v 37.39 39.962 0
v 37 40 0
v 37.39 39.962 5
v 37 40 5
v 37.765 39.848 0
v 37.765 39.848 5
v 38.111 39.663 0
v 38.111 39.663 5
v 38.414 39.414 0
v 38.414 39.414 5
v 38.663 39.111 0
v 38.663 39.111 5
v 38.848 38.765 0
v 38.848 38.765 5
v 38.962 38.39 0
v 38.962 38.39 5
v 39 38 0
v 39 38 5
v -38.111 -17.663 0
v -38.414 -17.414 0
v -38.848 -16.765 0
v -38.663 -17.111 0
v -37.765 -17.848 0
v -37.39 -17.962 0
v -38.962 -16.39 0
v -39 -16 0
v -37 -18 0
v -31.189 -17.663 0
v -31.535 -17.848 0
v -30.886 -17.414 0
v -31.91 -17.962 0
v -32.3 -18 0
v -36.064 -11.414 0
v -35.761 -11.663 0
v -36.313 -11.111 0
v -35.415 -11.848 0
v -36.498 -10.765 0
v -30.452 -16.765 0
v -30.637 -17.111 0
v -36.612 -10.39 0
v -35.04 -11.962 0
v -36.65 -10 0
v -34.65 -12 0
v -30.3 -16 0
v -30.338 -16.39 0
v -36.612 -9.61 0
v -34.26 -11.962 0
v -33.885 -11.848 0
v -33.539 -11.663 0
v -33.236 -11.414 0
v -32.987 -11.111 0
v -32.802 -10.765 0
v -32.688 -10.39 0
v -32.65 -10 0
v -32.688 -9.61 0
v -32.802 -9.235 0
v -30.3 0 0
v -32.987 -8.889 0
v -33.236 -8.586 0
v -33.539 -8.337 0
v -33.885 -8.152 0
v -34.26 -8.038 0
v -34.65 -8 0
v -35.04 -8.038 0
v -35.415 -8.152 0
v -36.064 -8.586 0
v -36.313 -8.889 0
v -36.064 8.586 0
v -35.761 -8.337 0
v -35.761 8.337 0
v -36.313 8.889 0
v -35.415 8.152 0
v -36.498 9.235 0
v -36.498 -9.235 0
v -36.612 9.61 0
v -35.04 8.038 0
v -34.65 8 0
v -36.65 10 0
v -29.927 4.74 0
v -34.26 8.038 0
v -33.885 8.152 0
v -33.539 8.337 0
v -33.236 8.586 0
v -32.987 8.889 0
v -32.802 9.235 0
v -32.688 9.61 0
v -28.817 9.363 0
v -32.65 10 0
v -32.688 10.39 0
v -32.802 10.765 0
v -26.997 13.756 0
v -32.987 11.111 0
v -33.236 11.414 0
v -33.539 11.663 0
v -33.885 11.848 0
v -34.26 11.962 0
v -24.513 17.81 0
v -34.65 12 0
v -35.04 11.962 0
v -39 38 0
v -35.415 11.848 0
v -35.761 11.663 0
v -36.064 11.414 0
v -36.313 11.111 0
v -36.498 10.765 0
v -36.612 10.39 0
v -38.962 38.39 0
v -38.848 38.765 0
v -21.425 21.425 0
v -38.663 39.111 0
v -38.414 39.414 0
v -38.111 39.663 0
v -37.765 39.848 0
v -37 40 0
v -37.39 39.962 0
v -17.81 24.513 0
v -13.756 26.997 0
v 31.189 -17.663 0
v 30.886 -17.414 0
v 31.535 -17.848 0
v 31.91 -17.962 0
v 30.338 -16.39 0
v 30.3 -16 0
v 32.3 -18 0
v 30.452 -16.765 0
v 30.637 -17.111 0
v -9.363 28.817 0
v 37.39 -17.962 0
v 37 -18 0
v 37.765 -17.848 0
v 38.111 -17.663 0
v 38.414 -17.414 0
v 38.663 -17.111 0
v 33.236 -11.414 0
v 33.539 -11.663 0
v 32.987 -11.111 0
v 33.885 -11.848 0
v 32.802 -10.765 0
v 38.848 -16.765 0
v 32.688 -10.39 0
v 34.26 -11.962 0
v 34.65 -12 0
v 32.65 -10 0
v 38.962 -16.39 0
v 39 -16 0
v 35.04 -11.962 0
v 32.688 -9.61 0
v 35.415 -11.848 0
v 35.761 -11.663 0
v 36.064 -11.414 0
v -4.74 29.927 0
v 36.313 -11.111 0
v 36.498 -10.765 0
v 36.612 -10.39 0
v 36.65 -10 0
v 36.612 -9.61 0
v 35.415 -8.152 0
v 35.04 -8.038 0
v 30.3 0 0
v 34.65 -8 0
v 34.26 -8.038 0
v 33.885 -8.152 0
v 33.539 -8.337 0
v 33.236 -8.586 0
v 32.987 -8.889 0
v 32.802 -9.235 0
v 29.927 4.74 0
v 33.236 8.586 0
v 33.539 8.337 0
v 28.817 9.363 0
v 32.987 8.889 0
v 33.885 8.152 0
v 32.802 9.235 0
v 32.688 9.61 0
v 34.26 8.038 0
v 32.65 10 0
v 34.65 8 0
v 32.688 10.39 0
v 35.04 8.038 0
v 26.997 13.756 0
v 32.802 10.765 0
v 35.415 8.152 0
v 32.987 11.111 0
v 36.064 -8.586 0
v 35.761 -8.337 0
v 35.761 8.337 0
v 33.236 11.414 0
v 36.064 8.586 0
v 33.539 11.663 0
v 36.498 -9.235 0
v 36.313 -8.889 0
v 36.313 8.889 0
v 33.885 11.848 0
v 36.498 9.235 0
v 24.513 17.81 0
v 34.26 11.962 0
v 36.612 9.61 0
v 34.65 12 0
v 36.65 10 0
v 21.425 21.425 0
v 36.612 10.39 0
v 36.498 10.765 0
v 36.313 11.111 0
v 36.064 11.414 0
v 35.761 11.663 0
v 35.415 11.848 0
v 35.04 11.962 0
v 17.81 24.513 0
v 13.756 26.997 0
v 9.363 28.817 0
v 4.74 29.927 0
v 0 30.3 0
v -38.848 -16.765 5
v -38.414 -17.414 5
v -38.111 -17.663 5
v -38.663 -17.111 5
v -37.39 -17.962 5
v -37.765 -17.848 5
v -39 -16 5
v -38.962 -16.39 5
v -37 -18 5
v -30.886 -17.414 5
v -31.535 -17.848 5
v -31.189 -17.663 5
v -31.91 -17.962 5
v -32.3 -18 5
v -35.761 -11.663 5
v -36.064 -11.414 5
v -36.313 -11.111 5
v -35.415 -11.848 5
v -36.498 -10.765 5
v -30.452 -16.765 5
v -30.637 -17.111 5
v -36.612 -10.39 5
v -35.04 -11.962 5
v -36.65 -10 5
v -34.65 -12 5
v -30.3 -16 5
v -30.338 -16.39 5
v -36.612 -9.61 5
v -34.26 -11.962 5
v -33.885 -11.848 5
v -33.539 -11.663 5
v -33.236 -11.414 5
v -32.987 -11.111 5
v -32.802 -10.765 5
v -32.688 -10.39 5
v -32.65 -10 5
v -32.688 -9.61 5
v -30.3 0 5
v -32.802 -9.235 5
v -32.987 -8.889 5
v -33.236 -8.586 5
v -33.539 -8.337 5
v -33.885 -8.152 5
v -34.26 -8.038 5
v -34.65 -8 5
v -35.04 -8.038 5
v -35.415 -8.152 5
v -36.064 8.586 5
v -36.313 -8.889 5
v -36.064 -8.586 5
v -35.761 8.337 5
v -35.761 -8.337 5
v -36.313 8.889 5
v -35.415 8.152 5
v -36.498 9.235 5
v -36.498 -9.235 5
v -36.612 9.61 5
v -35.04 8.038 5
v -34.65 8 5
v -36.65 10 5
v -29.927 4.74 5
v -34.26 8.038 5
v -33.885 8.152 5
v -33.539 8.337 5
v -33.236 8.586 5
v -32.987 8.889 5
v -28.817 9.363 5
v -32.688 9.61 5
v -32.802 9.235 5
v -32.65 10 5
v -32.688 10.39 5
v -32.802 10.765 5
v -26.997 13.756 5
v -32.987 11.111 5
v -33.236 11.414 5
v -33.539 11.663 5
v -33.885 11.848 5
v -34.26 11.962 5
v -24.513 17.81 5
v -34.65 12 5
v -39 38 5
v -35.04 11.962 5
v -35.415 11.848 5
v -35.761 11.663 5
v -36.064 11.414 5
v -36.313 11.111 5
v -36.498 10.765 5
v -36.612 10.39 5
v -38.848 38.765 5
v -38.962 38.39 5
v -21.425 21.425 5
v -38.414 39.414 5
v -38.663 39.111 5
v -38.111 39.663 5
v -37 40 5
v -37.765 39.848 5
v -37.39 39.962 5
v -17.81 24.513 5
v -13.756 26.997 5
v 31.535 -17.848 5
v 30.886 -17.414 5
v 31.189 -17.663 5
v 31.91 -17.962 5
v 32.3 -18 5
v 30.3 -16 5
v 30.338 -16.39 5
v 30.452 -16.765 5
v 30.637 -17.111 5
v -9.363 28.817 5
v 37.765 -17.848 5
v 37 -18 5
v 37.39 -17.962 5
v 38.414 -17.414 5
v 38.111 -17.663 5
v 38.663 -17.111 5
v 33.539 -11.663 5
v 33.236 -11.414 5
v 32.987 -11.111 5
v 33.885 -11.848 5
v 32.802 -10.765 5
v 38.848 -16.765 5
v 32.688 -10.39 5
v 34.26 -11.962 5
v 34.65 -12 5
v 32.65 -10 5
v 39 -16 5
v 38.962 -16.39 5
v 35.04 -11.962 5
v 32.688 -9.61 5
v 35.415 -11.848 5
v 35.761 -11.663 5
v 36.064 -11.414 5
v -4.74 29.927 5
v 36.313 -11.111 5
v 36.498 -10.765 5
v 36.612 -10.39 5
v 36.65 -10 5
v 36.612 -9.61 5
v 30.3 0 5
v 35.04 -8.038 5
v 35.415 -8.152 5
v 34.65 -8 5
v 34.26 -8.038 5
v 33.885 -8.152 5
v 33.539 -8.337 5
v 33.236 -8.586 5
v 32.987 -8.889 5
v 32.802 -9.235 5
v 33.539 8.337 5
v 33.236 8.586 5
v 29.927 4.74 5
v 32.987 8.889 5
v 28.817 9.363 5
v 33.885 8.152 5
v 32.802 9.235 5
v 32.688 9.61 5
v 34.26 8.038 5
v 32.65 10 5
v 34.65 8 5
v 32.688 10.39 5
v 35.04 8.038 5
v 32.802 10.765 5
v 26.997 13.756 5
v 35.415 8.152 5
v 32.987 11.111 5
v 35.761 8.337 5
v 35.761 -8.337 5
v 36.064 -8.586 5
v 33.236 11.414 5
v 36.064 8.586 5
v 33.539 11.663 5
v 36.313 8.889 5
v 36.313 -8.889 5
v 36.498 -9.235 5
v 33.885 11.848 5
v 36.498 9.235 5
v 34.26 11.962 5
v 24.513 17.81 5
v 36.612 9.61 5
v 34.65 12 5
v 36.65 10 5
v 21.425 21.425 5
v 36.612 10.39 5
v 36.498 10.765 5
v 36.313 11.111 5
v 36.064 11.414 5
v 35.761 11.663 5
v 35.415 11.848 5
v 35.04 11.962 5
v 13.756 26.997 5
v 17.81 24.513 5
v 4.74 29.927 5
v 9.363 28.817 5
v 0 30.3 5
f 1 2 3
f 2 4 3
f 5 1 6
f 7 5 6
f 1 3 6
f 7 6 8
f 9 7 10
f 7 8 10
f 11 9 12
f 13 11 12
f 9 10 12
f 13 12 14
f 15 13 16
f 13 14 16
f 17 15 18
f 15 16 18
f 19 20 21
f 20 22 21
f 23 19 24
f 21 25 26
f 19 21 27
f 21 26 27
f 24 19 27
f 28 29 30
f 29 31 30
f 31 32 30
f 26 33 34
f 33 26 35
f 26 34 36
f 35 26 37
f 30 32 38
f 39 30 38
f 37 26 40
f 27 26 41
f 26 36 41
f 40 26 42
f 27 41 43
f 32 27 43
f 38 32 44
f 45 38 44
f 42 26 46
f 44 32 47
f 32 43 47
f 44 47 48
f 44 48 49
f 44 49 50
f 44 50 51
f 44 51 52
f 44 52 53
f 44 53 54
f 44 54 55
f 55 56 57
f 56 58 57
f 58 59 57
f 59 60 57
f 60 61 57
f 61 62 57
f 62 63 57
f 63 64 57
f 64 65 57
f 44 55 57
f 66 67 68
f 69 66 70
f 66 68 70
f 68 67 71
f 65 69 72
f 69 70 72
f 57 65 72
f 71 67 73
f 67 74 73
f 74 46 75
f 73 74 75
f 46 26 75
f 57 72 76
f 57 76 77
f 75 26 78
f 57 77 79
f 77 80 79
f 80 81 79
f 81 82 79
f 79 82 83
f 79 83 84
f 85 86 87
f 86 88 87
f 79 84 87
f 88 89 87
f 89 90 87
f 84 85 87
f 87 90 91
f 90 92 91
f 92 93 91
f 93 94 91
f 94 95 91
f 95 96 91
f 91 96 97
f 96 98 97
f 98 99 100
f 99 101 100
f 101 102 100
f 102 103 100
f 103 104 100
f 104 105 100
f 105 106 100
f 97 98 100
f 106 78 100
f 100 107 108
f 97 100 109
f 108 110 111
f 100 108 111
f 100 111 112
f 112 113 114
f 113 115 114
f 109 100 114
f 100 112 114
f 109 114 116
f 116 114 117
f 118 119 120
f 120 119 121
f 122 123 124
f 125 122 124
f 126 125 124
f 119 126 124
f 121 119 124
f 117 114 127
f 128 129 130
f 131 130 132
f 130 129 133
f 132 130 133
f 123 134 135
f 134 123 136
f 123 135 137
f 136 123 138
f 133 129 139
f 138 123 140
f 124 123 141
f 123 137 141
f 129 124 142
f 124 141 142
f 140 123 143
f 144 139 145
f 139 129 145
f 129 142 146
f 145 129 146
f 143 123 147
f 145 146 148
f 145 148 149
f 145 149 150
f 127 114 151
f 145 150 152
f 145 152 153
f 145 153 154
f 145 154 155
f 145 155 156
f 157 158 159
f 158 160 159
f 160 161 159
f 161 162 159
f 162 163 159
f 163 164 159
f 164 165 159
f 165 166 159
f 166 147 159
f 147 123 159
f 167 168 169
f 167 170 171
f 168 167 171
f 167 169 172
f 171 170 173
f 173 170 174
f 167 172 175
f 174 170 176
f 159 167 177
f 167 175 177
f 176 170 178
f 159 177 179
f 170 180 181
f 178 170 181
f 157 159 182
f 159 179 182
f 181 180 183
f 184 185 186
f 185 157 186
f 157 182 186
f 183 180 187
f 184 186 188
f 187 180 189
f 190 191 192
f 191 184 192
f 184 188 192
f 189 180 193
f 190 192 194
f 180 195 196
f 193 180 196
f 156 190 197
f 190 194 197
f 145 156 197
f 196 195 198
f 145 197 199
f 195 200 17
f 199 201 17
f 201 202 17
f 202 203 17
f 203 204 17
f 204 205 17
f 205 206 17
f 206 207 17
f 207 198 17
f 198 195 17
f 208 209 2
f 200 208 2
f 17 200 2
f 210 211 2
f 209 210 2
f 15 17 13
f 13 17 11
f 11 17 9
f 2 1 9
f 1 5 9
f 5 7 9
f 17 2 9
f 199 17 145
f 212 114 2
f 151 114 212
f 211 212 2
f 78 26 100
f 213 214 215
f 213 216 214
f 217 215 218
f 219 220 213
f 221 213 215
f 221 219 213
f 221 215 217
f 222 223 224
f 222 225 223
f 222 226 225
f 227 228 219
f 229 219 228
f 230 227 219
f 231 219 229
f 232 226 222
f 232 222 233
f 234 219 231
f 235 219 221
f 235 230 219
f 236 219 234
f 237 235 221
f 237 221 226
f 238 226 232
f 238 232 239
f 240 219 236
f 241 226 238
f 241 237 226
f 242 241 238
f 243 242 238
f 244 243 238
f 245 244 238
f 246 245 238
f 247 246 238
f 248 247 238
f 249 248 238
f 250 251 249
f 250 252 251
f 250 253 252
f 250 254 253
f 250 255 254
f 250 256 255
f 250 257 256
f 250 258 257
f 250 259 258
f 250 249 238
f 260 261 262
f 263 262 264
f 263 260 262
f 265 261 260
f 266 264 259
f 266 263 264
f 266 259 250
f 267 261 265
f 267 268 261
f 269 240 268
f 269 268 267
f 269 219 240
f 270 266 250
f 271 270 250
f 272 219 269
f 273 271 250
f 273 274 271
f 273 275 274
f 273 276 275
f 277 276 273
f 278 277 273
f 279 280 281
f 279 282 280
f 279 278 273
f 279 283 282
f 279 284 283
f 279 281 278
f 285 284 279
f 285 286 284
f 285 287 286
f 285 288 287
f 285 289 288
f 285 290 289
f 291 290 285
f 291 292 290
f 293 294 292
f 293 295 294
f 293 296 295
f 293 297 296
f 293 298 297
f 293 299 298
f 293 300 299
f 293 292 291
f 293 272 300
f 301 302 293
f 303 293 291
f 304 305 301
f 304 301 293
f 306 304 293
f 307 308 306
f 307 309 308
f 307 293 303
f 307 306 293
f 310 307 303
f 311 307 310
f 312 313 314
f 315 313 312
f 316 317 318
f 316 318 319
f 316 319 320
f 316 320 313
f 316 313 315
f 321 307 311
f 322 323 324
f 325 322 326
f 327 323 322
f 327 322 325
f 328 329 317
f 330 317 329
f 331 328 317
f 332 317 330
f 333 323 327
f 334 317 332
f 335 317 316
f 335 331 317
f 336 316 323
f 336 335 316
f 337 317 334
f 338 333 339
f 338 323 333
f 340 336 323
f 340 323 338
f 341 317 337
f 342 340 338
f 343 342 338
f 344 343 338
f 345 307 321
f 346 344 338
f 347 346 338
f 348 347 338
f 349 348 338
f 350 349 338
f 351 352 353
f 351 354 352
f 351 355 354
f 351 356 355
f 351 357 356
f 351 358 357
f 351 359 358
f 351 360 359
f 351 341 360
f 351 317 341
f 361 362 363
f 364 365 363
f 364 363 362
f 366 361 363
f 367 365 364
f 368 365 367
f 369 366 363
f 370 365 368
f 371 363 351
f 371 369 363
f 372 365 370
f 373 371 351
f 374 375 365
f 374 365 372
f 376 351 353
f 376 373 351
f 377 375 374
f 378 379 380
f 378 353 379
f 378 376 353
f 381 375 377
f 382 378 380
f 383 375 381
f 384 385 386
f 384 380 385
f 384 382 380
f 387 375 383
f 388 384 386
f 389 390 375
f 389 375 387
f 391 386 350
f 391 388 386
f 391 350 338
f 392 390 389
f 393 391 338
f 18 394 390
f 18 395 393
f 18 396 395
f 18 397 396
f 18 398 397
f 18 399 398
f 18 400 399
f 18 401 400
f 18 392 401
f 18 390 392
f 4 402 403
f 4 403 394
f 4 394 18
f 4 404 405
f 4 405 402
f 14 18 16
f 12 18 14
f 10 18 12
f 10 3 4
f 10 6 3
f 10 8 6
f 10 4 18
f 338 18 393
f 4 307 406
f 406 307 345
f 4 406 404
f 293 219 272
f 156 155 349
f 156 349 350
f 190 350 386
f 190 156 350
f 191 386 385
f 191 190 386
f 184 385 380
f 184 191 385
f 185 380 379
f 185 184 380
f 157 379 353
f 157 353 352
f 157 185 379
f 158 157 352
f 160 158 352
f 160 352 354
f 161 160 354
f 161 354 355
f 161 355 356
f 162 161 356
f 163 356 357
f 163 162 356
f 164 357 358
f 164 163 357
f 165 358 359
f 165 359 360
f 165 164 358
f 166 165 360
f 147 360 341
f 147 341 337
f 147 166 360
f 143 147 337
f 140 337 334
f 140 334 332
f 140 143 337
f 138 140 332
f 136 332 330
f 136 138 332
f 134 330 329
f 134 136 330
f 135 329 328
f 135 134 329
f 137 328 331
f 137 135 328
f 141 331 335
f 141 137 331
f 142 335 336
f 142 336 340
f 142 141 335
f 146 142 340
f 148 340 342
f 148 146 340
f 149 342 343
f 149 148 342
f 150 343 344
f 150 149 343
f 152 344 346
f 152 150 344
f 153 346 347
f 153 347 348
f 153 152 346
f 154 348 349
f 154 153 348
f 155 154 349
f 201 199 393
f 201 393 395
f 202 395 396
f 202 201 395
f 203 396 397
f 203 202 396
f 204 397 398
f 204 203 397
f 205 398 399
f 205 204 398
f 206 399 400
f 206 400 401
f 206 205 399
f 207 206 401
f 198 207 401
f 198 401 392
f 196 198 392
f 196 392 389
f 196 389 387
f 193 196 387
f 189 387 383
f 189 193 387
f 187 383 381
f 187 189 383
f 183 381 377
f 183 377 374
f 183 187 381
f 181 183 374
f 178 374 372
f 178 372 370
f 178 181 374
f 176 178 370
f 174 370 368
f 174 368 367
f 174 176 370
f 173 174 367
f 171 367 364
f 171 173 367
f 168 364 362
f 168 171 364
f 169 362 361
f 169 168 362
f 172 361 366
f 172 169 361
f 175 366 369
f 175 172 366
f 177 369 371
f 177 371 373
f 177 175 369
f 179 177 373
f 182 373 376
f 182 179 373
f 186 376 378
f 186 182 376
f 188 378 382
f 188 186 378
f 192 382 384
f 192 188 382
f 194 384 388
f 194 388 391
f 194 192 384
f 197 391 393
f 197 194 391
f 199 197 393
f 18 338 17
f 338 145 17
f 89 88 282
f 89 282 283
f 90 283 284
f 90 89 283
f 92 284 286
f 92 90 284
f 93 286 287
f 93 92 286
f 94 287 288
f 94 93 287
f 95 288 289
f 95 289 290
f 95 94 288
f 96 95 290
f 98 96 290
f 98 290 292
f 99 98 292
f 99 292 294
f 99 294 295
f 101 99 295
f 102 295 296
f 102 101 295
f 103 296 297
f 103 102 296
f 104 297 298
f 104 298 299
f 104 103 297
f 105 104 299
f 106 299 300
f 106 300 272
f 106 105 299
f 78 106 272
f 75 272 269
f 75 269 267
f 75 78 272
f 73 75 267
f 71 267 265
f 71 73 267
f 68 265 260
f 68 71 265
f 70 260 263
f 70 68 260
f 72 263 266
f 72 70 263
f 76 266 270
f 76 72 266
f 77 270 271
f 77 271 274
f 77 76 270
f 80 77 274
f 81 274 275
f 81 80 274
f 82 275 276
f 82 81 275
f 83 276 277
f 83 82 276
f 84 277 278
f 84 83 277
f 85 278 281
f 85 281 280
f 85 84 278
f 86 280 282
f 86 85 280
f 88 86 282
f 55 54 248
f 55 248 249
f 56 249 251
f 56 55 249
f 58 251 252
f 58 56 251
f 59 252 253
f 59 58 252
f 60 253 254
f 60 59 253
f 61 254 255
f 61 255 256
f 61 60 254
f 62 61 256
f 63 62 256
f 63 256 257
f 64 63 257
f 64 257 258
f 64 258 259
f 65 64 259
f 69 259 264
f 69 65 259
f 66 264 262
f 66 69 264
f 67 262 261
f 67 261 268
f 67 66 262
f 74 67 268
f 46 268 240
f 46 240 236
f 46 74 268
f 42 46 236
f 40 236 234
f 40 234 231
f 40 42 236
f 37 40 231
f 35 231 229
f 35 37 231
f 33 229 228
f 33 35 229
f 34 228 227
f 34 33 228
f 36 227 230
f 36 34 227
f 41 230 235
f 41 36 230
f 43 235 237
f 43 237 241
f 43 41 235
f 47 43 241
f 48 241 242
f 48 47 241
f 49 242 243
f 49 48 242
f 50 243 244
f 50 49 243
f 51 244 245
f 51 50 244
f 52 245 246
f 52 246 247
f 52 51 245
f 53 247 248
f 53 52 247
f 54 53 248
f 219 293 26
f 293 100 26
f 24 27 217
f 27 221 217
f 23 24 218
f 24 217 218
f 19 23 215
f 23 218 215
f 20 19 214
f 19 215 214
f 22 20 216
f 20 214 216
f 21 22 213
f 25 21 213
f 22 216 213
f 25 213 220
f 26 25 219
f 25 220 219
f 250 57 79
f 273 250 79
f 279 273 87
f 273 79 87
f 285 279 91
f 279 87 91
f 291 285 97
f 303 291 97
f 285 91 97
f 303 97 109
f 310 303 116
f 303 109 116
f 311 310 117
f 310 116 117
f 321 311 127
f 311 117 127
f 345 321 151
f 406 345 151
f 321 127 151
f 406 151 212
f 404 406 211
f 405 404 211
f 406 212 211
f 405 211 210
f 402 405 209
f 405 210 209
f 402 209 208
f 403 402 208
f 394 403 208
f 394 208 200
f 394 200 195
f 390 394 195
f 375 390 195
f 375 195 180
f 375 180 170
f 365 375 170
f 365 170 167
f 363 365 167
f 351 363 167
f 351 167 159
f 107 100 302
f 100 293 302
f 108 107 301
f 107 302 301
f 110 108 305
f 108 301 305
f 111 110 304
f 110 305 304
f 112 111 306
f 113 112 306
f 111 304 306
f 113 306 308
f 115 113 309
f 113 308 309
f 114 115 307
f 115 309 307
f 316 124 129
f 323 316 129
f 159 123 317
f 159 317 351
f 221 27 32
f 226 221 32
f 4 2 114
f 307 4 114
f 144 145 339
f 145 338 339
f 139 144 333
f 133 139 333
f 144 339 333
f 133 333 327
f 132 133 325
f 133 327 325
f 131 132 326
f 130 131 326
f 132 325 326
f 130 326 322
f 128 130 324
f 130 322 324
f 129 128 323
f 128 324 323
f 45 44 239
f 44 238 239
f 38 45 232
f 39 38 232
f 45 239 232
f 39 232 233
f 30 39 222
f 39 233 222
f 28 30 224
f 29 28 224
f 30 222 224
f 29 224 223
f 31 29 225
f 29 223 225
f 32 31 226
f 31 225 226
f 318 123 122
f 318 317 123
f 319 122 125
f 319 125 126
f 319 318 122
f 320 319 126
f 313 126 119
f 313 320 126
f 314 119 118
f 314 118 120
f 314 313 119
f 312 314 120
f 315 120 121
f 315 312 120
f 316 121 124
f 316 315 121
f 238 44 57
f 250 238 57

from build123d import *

# Parameters (mm, degrees)
SKETCH_1_R      = 2
SKETCH_1_W      = 8.7
SKETCH_1_H      = 18
EXTRUDE_1_DEPTH = 5
FILLET_1_R      = 2


with BuildPart() as part:
    # 草图1 → 凸台-拉伸1 (new body)
    # profile 1 of 3: a face of its own
    with BuildSketch(Plane.XY):
        with BuildLine():
            Line((39, 40), (-39, 40))
            Line((-39, 40), (-39, 0))
            Line((-39, 0), (-30.3, 0))
            ThreePointArc((-30.3, 0), (0, 30.3), (30.3, 0))
            Line((30.3, 0), (39, 0))
            Line((39, 0), (39, 40))
        make_face()
        with Locations((-34.65, 10)):
            Circle(SKETCH_1_R, mode=Mode.SUBTRACT)
        with Locations((34.65, 10)):
            Circle(SKETCH_1_R, mode=Mode.SUBTRACT)
    # profile 2 of 3: a face of its own
    with BuildSketch(Plane.XY):
        with Locations((-34.65, -9)):
            Rectangle(SKETCH_1_W, SKETCH_1_H)
        with Locations((-34.65, -10)):
            Circle(SKETCH_1_R, mode=Mode.SUBTRACT)
    # profile 3 of 3: a face of its own
    with BuildSketch(Plane.XY):
        with Locations((34.65, -9)):
            Rectangle(SKETCH_1_W, SKETCH_1_H)
        with Locations((34.65, -10)):
            Circle(SKETCH_1_R, mode=Mode.SUBTRACT)
    extrude(amount=EXTRUDE_1_DEPTH)

    # 圆角1
    fillet_1_edges = [part.edges().sort_by_distance(p)[0] for p in [
        (-30.3, -18, 2.5),
        (-39, -18, 2.5),
        (-39, 40, 2.5),
        (39, 40, 2.5),
        (39, -18, 2.5),
        (30.3, -18, 2.5),
    ]]
    fillet(fillet_1_edges, radius=FILLET_1_R)


solid = part.part
